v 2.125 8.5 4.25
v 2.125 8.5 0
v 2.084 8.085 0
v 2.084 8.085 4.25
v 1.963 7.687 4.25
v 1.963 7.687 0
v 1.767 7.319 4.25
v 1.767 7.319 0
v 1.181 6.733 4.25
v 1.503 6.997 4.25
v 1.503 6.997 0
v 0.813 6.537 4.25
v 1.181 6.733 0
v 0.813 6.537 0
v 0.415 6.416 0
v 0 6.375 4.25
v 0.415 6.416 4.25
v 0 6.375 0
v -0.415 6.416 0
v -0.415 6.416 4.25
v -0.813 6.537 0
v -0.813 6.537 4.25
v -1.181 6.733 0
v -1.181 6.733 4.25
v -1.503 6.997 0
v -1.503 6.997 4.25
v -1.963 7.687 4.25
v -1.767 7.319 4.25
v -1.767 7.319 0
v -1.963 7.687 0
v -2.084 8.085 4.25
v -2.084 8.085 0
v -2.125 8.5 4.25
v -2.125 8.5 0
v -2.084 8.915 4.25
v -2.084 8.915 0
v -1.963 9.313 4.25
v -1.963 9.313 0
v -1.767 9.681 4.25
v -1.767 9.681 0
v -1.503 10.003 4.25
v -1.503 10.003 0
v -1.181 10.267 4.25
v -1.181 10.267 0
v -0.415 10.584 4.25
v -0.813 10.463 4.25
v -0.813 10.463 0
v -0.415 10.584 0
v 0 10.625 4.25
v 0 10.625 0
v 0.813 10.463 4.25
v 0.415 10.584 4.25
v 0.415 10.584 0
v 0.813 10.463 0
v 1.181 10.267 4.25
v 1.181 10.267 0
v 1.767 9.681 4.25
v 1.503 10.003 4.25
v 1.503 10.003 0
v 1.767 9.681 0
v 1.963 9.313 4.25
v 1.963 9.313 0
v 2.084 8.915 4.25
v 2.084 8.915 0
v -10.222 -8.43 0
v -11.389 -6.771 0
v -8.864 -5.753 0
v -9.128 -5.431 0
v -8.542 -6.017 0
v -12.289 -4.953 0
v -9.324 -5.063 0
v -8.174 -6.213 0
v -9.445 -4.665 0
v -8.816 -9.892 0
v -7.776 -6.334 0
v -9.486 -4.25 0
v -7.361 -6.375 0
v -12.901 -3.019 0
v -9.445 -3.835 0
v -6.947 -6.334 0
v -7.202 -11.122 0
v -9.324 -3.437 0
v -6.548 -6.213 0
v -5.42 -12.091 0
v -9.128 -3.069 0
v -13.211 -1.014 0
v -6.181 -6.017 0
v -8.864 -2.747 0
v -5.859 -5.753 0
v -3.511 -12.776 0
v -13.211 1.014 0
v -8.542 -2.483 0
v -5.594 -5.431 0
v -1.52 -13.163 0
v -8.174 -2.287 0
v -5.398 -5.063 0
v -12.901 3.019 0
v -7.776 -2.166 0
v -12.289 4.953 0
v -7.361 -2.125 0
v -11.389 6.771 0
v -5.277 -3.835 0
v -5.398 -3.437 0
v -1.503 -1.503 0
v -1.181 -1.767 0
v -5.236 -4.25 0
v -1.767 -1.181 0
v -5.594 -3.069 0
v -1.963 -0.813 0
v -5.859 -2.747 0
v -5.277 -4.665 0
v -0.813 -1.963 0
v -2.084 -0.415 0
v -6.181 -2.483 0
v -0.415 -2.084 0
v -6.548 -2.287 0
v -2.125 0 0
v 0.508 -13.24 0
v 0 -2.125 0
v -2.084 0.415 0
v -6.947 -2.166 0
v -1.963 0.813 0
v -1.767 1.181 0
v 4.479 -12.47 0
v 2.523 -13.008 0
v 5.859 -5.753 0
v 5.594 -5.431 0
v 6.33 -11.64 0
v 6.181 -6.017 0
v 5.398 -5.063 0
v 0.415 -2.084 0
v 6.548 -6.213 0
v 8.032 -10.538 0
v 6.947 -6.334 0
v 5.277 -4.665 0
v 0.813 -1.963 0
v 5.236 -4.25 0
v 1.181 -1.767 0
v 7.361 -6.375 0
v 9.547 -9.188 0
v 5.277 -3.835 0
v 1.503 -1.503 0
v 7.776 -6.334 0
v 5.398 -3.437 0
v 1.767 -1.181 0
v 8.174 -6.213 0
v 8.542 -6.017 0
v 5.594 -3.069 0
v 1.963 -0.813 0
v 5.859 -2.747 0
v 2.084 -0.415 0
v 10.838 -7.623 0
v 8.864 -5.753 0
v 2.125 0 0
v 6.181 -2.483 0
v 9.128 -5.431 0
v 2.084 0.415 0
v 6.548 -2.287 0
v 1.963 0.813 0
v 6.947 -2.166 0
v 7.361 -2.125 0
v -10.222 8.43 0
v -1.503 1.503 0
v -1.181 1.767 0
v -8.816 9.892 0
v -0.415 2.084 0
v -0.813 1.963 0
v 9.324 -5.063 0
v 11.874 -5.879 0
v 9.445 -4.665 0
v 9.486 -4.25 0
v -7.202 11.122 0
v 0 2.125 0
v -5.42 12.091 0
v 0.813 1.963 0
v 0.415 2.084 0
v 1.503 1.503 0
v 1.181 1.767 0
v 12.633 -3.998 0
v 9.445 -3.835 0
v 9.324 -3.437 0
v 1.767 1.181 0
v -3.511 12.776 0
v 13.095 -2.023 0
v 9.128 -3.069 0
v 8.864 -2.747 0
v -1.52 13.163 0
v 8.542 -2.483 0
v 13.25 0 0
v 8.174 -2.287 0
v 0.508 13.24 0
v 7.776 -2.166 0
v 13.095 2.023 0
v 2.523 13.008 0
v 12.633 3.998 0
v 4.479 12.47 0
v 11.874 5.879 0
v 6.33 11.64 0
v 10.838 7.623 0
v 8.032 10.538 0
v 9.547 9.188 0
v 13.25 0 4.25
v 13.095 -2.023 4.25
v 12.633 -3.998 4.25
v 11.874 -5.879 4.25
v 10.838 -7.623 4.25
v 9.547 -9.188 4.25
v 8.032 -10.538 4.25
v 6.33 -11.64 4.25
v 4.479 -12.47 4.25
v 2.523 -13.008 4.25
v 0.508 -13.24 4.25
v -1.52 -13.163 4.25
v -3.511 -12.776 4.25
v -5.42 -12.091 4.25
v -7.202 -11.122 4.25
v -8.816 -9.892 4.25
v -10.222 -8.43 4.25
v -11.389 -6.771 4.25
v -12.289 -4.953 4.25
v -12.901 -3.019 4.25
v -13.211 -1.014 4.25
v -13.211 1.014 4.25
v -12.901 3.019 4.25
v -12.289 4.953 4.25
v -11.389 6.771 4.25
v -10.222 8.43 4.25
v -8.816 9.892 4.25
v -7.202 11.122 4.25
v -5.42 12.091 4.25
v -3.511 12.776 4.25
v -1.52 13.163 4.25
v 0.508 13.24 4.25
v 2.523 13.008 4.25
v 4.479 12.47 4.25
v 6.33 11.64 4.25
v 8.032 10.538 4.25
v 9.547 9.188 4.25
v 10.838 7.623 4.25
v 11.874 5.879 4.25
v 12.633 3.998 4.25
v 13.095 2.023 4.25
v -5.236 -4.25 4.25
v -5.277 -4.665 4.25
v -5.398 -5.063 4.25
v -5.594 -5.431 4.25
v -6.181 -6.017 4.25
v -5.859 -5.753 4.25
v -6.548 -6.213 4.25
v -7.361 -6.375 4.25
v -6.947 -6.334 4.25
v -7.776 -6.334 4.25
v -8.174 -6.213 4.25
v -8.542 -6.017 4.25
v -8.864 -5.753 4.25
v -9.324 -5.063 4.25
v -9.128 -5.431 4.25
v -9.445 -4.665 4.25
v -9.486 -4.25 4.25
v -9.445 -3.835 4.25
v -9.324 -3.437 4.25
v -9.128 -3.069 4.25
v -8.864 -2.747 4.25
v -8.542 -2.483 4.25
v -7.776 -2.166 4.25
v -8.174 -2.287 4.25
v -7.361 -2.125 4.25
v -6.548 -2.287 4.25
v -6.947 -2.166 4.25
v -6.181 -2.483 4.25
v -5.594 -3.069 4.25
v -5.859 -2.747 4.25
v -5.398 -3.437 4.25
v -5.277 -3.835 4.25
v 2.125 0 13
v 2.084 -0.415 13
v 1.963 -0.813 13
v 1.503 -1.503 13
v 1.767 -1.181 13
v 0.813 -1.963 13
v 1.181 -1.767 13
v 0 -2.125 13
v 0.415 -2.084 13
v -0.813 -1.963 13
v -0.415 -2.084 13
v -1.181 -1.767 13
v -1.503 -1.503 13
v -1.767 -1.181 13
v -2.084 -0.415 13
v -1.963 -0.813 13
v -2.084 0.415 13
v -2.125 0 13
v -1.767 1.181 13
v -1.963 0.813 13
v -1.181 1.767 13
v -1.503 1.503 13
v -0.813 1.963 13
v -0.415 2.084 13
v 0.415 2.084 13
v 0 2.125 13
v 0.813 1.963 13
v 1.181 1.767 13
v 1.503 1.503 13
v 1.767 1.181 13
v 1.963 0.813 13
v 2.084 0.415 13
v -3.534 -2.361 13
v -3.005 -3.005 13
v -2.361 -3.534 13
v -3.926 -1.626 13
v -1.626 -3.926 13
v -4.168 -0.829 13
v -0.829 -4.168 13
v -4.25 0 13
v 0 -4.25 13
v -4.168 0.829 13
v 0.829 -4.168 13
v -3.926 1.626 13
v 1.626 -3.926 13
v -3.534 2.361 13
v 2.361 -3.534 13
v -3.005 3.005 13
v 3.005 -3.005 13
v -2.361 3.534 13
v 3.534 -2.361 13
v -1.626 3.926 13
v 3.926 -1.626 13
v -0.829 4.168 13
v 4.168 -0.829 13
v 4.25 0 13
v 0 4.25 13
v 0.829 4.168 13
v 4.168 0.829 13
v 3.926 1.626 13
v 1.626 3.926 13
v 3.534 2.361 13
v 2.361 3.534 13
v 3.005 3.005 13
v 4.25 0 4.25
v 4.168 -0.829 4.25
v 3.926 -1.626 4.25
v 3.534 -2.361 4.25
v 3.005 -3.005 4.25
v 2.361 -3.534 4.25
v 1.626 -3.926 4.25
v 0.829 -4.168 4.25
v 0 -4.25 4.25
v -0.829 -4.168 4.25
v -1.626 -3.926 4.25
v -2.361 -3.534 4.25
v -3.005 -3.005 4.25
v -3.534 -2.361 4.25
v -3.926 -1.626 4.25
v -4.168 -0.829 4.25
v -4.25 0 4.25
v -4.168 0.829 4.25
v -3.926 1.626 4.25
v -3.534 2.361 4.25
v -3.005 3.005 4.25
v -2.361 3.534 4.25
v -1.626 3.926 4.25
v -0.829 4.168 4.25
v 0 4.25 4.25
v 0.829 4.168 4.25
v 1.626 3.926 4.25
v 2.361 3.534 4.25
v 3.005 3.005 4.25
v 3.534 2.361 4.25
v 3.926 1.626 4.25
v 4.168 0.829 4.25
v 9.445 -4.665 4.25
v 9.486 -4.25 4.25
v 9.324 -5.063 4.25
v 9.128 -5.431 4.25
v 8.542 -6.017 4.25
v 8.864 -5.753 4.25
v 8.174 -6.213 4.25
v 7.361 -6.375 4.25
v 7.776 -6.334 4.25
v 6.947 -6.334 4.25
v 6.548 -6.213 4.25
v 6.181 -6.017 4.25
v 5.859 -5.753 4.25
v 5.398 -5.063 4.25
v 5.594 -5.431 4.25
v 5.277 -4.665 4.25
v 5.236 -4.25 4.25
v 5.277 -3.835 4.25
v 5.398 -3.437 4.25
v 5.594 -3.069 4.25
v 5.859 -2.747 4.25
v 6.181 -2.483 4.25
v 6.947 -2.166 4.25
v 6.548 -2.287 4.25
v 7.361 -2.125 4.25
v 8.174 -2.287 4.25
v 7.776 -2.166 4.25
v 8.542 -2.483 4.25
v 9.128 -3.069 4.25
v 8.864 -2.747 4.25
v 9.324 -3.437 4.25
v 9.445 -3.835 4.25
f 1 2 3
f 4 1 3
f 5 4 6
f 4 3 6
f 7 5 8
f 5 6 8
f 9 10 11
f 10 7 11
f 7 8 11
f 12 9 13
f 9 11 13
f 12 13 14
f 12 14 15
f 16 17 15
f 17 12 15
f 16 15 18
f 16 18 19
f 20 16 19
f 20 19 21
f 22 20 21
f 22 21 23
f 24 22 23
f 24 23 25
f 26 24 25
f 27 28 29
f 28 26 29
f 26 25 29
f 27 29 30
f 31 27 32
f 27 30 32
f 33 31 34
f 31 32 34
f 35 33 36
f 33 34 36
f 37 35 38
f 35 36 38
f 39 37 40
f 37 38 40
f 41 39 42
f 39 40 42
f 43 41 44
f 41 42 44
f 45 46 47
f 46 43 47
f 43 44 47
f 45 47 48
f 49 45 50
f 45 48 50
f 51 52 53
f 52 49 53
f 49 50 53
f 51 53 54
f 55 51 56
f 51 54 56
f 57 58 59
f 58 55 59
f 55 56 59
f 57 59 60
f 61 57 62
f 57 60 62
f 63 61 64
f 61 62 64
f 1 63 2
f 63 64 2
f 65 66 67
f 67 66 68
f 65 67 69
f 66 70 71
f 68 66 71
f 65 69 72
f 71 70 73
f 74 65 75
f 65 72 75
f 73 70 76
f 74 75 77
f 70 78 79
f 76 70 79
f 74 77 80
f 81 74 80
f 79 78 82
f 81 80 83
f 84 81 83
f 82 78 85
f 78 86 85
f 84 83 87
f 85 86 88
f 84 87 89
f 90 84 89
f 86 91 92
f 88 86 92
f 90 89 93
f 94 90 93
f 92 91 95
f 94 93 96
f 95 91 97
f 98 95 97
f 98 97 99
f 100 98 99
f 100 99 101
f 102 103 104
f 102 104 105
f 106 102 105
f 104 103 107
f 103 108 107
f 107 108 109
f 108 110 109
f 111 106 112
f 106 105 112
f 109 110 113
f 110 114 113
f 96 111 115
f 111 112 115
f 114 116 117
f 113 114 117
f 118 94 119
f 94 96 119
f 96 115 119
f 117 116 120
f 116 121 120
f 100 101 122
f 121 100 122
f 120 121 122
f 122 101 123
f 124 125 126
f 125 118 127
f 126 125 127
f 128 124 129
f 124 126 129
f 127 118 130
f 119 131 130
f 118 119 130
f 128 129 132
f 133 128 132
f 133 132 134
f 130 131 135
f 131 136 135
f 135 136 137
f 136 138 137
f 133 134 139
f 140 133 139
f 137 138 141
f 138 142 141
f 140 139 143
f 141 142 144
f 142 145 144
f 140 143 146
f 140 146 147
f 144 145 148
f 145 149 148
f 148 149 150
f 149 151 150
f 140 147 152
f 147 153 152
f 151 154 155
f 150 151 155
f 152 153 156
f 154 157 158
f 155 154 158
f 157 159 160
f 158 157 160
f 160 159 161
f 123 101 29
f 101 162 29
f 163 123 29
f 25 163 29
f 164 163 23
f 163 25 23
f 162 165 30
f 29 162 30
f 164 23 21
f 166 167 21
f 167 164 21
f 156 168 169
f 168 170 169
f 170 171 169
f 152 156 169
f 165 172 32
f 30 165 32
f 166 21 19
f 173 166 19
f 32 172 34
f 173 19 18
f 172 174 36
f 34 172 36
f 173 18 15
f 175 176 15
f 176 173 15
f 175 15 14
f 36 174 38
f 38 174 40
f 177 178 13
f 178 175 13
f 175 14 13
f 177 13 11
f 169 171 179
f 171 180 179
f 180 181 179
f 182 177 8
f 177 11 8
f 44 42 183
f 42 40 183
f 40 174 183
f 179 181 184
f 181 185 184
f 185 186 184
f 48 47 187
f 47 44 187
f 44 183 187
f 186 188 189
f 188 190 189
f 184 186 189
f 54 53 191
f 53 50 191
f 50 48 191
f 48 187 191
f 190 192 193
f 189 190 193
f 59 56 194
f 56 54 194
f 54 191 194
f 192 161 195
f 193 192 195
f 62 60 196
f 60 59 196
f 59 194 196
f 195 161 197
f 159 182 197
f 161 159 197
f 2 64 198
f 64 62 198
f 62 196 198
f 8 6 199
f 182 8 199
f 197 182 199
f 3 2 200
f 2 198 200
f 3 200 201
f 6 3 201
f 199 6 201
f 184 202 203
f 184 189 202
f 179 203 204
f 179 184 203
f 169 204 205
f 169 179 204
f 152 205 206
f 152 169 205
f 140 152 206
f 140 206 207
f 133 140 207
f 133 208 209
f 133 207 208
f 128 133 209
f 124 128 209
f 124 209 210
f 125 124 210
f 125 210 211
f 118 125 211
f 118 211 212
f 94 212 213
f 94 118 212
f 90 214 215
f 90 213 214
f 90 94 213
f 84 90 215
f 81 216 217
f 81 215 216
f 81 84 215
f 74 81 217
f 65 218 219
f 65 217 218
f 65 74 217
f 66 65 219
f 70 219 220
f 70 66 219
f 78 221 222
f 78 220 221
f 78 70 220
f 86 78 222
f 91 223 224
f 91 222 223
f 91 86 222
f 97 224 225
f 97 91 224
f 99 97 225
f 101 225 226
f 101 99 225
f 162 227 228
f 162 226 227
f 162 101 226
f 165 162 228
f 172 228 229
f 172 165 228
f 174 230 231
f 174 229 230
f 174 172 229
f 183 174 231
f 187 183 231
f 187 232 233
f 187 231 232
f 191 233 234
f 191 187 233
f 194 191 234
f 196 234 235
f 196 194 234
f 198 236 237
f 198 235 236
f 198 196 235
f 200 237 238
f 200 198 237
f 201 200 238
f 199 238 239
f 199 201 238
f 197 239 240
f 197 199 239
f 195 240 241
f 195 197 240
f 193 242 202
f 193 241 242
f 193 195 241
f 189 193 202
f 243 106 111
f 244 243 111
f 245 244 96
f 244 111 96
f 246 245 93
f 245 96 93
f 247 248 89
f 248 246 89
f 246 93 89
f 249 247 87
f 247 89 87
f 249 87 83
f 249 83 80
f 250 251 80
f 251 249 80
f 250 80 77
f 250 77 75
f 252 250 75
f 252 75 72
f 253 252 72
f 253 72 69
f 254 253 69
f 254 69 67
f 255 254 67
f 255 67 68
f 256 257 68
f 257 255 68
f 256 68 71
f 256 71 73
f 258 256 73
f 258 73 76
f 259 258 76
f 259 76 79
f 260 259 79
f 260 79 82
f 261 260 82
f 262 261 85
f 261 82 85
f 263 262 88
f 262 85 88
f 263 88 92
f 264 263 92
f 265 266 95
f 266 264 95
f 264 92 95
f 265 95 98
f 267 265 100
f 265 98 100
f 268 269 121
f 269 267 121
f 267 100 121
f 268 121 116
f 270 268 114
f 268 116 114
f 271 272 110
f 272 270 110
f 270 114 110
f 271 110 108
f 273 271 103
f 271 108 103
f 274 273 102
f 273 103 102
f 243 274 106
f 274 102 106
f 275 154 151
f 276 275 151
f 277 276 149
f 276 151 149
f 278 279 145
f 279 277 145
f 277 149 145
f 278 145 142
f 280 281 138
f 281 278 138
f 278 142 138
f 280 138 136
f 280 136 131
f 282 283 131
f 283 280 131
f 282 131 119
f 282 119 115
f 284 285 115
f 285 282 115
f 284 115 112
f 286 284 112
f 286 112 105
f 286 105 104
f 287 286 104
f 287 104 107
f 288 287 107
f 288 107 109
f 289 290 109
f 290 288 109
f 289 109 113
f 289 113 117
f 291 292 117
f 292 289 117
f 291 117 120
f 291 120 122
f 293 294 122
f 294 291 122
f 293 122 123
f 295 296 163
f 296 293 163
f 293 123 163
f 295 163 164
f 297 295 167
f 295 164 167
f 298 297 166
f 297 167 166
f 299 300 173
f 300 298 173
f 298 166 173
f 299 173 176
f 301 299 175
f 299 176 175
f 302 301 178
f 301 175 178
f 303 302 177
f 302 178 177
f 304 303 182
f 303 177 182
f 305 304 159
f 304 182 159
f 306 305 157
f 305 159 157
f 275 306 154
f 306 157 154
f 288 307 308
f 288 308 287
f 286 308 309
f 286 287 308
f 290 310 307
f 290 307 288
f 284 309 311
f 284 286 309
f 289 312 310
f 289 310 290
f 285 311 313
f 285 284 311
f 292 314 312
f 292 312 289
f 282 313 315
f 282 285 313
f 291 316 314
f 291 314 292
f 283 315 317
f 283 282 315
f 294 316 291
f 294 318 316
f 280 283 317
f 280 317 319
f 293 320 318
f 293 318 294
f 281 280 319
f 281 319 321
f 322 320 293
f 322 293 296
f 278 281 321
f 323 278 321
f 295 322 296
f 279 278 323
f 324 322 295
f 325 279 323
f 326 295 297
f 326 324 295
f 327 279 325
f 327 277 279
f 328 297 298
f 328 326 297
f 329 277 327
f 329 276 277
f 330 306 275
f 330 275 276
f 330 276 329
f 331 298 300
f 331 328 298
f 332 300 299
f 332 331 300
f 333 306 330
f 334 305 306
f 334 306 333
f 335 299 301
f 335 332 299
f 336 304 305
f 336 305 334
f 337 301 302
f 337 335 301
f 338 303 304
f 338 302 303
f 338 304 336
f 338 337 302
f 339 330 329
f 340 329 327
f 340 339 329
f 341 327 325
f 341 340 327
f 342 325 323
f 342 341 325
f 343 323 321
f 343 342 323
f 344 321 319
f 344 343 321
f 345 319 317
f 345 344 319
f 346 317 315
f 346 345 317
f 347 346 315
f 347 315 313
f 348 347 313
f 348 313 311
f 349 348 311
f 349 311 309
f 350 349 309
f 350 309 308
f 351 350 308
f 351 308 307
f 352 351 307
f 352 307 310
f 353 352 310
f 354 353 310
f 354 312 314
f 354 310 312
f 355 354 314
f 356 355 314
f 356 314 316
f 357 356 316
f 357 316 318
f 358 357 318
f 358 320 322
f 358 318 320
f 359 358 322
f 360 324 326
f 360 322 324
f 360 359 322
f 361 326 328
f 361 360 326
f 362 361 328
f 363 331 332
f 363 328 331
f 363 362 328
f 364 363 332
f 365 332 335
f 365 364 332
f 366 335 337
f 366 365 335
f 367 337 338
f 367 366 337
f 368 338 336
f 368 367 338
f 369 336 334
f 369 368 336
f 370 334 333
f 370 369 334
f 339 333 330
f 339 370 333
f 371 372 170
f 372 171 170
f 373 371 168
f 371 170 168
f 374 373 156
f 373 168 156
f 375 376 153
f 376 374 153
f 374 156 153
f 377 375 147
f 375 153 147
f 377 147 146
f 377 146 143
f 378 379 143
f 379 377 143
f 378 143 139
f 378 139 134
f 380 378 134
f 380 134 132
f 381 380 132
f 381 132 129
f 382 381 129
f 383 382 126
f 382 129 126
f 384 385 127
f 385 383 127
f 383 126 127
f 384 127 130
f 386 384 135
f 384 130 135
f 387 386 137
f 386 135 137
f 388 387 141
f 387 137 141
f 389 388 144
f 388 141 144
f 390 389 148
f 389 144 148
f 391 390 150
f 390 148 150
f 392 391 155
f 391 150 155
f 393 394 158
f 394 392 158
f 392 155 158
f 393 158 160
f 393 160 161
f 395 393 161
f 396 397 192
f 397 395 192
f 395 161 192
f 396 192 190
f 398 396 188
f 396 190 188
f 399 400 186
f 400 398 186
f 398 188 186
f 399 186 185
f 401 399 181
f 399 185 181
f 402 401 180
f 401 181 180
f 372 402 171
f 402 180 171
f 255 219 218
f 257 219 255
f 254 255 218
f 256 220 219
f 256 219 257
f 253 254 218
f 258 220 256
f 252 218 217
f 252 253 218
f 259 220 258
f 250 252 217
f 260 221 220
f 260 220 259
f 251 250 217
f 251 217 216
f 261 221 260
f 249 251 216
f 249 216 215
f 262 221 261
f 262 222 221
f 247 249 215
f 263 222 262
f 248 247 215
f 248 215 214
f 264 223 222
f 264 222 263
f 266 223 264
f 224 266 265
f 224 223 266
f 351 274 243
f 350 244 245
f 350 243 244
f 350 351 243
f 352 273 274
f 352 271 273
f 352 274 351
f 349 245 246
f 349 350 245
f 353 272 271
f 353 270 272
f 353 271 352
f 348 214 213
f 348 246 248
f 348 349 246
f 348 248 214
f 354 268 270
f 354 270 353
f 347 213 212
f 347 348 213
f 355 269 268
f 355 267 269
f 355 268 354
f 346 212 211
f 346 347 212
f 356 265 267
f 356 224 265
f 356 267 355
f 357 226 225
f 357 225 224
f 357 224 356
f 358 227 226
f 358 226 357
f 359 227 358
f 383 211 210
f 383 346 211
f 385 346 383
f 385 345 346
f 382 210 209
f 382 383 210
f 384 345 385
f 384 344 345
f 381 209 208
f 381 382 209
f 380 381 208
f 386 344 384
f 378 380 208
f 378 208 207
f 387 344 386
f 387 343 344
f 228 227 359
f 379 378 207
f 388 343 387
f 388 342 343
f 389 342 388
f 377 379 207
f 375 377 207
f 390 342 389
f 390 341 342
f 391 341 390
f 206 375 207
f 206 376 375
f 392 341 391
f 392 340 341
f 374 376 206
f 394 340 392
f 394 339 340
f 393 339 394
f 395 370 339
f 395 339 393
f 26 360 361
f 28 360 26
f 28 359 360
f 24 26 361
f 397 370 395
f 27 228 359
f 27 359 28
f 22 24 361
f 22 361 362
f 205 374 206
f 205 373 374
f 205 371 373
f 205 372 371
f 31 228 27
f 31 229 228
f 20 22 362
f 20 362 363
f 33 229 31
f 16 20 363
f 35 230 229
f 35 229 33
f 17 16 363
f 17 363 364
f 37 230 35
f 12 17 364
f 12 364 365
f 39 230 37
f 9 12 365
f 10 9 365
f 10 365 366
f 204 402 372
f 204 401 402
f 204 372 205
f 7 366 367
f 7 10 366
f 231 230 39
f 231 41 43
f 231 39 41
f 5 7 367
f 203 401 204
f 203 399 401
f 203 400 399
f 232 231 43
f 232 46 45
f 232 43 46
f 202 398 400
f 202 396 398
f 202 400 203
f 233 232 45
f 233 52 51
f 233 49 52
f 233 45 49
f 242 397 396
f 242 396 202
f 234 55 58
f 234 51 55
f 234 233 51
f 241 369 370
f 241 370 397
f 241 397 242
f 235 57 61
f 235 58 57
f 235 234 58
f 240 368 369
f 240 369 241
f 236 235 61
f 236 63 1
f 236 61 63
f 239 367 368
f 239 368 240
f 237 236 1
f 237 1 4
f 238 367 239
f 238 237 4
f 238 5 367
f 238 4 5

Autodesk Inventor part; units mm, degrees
ref_plane "YZ Plane" through (0, 0, 0) normal (1, 0, 0) x (0, 1, 0)
ref_plane "XZ Plane" through (0, 0, 0) normal (0, 1, 0) x (-1, 0, 0)
ref_plane "XY Plane" through (0, 0, 0) normal (0, 0, 1) x (1, 0, 0)
sketch "Sketch1" plane through (0, 0, 0) normal (0, 0, 1) x (1, 0, 0)
  circle A0 centre (0, 0) radius 13.25
  circle A1 centre (0, 8.5) radius 2.125
  circle A2 centre (0, 0) radius 2.125
  circle A3 centre (0, 0) radius 4.25
  circle A4 centre (-7.3612, -4.25) radius 2.125
  circle A5 centre (7.3612, -4.25) radius 2.125
  dimension "d0" = 26.5
  dimension "d1" = 4.25
  dimension "d2" = 8.5
  dimension "d3" = 0
  dimension "d4" = 4.25
  dimension "d5" = 8.5
  dimension "d8" = 360
extrude "Extrusion1" add sketch "Sketch1" along normal blind 4.25 contours A0 | A3
extrude "Extrusion2" add sketch "Sketch1" along normal blind 13 contours A3
equation "\"d4\" = d1"
equation "\"d5\" = 2 * d1"
equation "\"d10\" = d1"
